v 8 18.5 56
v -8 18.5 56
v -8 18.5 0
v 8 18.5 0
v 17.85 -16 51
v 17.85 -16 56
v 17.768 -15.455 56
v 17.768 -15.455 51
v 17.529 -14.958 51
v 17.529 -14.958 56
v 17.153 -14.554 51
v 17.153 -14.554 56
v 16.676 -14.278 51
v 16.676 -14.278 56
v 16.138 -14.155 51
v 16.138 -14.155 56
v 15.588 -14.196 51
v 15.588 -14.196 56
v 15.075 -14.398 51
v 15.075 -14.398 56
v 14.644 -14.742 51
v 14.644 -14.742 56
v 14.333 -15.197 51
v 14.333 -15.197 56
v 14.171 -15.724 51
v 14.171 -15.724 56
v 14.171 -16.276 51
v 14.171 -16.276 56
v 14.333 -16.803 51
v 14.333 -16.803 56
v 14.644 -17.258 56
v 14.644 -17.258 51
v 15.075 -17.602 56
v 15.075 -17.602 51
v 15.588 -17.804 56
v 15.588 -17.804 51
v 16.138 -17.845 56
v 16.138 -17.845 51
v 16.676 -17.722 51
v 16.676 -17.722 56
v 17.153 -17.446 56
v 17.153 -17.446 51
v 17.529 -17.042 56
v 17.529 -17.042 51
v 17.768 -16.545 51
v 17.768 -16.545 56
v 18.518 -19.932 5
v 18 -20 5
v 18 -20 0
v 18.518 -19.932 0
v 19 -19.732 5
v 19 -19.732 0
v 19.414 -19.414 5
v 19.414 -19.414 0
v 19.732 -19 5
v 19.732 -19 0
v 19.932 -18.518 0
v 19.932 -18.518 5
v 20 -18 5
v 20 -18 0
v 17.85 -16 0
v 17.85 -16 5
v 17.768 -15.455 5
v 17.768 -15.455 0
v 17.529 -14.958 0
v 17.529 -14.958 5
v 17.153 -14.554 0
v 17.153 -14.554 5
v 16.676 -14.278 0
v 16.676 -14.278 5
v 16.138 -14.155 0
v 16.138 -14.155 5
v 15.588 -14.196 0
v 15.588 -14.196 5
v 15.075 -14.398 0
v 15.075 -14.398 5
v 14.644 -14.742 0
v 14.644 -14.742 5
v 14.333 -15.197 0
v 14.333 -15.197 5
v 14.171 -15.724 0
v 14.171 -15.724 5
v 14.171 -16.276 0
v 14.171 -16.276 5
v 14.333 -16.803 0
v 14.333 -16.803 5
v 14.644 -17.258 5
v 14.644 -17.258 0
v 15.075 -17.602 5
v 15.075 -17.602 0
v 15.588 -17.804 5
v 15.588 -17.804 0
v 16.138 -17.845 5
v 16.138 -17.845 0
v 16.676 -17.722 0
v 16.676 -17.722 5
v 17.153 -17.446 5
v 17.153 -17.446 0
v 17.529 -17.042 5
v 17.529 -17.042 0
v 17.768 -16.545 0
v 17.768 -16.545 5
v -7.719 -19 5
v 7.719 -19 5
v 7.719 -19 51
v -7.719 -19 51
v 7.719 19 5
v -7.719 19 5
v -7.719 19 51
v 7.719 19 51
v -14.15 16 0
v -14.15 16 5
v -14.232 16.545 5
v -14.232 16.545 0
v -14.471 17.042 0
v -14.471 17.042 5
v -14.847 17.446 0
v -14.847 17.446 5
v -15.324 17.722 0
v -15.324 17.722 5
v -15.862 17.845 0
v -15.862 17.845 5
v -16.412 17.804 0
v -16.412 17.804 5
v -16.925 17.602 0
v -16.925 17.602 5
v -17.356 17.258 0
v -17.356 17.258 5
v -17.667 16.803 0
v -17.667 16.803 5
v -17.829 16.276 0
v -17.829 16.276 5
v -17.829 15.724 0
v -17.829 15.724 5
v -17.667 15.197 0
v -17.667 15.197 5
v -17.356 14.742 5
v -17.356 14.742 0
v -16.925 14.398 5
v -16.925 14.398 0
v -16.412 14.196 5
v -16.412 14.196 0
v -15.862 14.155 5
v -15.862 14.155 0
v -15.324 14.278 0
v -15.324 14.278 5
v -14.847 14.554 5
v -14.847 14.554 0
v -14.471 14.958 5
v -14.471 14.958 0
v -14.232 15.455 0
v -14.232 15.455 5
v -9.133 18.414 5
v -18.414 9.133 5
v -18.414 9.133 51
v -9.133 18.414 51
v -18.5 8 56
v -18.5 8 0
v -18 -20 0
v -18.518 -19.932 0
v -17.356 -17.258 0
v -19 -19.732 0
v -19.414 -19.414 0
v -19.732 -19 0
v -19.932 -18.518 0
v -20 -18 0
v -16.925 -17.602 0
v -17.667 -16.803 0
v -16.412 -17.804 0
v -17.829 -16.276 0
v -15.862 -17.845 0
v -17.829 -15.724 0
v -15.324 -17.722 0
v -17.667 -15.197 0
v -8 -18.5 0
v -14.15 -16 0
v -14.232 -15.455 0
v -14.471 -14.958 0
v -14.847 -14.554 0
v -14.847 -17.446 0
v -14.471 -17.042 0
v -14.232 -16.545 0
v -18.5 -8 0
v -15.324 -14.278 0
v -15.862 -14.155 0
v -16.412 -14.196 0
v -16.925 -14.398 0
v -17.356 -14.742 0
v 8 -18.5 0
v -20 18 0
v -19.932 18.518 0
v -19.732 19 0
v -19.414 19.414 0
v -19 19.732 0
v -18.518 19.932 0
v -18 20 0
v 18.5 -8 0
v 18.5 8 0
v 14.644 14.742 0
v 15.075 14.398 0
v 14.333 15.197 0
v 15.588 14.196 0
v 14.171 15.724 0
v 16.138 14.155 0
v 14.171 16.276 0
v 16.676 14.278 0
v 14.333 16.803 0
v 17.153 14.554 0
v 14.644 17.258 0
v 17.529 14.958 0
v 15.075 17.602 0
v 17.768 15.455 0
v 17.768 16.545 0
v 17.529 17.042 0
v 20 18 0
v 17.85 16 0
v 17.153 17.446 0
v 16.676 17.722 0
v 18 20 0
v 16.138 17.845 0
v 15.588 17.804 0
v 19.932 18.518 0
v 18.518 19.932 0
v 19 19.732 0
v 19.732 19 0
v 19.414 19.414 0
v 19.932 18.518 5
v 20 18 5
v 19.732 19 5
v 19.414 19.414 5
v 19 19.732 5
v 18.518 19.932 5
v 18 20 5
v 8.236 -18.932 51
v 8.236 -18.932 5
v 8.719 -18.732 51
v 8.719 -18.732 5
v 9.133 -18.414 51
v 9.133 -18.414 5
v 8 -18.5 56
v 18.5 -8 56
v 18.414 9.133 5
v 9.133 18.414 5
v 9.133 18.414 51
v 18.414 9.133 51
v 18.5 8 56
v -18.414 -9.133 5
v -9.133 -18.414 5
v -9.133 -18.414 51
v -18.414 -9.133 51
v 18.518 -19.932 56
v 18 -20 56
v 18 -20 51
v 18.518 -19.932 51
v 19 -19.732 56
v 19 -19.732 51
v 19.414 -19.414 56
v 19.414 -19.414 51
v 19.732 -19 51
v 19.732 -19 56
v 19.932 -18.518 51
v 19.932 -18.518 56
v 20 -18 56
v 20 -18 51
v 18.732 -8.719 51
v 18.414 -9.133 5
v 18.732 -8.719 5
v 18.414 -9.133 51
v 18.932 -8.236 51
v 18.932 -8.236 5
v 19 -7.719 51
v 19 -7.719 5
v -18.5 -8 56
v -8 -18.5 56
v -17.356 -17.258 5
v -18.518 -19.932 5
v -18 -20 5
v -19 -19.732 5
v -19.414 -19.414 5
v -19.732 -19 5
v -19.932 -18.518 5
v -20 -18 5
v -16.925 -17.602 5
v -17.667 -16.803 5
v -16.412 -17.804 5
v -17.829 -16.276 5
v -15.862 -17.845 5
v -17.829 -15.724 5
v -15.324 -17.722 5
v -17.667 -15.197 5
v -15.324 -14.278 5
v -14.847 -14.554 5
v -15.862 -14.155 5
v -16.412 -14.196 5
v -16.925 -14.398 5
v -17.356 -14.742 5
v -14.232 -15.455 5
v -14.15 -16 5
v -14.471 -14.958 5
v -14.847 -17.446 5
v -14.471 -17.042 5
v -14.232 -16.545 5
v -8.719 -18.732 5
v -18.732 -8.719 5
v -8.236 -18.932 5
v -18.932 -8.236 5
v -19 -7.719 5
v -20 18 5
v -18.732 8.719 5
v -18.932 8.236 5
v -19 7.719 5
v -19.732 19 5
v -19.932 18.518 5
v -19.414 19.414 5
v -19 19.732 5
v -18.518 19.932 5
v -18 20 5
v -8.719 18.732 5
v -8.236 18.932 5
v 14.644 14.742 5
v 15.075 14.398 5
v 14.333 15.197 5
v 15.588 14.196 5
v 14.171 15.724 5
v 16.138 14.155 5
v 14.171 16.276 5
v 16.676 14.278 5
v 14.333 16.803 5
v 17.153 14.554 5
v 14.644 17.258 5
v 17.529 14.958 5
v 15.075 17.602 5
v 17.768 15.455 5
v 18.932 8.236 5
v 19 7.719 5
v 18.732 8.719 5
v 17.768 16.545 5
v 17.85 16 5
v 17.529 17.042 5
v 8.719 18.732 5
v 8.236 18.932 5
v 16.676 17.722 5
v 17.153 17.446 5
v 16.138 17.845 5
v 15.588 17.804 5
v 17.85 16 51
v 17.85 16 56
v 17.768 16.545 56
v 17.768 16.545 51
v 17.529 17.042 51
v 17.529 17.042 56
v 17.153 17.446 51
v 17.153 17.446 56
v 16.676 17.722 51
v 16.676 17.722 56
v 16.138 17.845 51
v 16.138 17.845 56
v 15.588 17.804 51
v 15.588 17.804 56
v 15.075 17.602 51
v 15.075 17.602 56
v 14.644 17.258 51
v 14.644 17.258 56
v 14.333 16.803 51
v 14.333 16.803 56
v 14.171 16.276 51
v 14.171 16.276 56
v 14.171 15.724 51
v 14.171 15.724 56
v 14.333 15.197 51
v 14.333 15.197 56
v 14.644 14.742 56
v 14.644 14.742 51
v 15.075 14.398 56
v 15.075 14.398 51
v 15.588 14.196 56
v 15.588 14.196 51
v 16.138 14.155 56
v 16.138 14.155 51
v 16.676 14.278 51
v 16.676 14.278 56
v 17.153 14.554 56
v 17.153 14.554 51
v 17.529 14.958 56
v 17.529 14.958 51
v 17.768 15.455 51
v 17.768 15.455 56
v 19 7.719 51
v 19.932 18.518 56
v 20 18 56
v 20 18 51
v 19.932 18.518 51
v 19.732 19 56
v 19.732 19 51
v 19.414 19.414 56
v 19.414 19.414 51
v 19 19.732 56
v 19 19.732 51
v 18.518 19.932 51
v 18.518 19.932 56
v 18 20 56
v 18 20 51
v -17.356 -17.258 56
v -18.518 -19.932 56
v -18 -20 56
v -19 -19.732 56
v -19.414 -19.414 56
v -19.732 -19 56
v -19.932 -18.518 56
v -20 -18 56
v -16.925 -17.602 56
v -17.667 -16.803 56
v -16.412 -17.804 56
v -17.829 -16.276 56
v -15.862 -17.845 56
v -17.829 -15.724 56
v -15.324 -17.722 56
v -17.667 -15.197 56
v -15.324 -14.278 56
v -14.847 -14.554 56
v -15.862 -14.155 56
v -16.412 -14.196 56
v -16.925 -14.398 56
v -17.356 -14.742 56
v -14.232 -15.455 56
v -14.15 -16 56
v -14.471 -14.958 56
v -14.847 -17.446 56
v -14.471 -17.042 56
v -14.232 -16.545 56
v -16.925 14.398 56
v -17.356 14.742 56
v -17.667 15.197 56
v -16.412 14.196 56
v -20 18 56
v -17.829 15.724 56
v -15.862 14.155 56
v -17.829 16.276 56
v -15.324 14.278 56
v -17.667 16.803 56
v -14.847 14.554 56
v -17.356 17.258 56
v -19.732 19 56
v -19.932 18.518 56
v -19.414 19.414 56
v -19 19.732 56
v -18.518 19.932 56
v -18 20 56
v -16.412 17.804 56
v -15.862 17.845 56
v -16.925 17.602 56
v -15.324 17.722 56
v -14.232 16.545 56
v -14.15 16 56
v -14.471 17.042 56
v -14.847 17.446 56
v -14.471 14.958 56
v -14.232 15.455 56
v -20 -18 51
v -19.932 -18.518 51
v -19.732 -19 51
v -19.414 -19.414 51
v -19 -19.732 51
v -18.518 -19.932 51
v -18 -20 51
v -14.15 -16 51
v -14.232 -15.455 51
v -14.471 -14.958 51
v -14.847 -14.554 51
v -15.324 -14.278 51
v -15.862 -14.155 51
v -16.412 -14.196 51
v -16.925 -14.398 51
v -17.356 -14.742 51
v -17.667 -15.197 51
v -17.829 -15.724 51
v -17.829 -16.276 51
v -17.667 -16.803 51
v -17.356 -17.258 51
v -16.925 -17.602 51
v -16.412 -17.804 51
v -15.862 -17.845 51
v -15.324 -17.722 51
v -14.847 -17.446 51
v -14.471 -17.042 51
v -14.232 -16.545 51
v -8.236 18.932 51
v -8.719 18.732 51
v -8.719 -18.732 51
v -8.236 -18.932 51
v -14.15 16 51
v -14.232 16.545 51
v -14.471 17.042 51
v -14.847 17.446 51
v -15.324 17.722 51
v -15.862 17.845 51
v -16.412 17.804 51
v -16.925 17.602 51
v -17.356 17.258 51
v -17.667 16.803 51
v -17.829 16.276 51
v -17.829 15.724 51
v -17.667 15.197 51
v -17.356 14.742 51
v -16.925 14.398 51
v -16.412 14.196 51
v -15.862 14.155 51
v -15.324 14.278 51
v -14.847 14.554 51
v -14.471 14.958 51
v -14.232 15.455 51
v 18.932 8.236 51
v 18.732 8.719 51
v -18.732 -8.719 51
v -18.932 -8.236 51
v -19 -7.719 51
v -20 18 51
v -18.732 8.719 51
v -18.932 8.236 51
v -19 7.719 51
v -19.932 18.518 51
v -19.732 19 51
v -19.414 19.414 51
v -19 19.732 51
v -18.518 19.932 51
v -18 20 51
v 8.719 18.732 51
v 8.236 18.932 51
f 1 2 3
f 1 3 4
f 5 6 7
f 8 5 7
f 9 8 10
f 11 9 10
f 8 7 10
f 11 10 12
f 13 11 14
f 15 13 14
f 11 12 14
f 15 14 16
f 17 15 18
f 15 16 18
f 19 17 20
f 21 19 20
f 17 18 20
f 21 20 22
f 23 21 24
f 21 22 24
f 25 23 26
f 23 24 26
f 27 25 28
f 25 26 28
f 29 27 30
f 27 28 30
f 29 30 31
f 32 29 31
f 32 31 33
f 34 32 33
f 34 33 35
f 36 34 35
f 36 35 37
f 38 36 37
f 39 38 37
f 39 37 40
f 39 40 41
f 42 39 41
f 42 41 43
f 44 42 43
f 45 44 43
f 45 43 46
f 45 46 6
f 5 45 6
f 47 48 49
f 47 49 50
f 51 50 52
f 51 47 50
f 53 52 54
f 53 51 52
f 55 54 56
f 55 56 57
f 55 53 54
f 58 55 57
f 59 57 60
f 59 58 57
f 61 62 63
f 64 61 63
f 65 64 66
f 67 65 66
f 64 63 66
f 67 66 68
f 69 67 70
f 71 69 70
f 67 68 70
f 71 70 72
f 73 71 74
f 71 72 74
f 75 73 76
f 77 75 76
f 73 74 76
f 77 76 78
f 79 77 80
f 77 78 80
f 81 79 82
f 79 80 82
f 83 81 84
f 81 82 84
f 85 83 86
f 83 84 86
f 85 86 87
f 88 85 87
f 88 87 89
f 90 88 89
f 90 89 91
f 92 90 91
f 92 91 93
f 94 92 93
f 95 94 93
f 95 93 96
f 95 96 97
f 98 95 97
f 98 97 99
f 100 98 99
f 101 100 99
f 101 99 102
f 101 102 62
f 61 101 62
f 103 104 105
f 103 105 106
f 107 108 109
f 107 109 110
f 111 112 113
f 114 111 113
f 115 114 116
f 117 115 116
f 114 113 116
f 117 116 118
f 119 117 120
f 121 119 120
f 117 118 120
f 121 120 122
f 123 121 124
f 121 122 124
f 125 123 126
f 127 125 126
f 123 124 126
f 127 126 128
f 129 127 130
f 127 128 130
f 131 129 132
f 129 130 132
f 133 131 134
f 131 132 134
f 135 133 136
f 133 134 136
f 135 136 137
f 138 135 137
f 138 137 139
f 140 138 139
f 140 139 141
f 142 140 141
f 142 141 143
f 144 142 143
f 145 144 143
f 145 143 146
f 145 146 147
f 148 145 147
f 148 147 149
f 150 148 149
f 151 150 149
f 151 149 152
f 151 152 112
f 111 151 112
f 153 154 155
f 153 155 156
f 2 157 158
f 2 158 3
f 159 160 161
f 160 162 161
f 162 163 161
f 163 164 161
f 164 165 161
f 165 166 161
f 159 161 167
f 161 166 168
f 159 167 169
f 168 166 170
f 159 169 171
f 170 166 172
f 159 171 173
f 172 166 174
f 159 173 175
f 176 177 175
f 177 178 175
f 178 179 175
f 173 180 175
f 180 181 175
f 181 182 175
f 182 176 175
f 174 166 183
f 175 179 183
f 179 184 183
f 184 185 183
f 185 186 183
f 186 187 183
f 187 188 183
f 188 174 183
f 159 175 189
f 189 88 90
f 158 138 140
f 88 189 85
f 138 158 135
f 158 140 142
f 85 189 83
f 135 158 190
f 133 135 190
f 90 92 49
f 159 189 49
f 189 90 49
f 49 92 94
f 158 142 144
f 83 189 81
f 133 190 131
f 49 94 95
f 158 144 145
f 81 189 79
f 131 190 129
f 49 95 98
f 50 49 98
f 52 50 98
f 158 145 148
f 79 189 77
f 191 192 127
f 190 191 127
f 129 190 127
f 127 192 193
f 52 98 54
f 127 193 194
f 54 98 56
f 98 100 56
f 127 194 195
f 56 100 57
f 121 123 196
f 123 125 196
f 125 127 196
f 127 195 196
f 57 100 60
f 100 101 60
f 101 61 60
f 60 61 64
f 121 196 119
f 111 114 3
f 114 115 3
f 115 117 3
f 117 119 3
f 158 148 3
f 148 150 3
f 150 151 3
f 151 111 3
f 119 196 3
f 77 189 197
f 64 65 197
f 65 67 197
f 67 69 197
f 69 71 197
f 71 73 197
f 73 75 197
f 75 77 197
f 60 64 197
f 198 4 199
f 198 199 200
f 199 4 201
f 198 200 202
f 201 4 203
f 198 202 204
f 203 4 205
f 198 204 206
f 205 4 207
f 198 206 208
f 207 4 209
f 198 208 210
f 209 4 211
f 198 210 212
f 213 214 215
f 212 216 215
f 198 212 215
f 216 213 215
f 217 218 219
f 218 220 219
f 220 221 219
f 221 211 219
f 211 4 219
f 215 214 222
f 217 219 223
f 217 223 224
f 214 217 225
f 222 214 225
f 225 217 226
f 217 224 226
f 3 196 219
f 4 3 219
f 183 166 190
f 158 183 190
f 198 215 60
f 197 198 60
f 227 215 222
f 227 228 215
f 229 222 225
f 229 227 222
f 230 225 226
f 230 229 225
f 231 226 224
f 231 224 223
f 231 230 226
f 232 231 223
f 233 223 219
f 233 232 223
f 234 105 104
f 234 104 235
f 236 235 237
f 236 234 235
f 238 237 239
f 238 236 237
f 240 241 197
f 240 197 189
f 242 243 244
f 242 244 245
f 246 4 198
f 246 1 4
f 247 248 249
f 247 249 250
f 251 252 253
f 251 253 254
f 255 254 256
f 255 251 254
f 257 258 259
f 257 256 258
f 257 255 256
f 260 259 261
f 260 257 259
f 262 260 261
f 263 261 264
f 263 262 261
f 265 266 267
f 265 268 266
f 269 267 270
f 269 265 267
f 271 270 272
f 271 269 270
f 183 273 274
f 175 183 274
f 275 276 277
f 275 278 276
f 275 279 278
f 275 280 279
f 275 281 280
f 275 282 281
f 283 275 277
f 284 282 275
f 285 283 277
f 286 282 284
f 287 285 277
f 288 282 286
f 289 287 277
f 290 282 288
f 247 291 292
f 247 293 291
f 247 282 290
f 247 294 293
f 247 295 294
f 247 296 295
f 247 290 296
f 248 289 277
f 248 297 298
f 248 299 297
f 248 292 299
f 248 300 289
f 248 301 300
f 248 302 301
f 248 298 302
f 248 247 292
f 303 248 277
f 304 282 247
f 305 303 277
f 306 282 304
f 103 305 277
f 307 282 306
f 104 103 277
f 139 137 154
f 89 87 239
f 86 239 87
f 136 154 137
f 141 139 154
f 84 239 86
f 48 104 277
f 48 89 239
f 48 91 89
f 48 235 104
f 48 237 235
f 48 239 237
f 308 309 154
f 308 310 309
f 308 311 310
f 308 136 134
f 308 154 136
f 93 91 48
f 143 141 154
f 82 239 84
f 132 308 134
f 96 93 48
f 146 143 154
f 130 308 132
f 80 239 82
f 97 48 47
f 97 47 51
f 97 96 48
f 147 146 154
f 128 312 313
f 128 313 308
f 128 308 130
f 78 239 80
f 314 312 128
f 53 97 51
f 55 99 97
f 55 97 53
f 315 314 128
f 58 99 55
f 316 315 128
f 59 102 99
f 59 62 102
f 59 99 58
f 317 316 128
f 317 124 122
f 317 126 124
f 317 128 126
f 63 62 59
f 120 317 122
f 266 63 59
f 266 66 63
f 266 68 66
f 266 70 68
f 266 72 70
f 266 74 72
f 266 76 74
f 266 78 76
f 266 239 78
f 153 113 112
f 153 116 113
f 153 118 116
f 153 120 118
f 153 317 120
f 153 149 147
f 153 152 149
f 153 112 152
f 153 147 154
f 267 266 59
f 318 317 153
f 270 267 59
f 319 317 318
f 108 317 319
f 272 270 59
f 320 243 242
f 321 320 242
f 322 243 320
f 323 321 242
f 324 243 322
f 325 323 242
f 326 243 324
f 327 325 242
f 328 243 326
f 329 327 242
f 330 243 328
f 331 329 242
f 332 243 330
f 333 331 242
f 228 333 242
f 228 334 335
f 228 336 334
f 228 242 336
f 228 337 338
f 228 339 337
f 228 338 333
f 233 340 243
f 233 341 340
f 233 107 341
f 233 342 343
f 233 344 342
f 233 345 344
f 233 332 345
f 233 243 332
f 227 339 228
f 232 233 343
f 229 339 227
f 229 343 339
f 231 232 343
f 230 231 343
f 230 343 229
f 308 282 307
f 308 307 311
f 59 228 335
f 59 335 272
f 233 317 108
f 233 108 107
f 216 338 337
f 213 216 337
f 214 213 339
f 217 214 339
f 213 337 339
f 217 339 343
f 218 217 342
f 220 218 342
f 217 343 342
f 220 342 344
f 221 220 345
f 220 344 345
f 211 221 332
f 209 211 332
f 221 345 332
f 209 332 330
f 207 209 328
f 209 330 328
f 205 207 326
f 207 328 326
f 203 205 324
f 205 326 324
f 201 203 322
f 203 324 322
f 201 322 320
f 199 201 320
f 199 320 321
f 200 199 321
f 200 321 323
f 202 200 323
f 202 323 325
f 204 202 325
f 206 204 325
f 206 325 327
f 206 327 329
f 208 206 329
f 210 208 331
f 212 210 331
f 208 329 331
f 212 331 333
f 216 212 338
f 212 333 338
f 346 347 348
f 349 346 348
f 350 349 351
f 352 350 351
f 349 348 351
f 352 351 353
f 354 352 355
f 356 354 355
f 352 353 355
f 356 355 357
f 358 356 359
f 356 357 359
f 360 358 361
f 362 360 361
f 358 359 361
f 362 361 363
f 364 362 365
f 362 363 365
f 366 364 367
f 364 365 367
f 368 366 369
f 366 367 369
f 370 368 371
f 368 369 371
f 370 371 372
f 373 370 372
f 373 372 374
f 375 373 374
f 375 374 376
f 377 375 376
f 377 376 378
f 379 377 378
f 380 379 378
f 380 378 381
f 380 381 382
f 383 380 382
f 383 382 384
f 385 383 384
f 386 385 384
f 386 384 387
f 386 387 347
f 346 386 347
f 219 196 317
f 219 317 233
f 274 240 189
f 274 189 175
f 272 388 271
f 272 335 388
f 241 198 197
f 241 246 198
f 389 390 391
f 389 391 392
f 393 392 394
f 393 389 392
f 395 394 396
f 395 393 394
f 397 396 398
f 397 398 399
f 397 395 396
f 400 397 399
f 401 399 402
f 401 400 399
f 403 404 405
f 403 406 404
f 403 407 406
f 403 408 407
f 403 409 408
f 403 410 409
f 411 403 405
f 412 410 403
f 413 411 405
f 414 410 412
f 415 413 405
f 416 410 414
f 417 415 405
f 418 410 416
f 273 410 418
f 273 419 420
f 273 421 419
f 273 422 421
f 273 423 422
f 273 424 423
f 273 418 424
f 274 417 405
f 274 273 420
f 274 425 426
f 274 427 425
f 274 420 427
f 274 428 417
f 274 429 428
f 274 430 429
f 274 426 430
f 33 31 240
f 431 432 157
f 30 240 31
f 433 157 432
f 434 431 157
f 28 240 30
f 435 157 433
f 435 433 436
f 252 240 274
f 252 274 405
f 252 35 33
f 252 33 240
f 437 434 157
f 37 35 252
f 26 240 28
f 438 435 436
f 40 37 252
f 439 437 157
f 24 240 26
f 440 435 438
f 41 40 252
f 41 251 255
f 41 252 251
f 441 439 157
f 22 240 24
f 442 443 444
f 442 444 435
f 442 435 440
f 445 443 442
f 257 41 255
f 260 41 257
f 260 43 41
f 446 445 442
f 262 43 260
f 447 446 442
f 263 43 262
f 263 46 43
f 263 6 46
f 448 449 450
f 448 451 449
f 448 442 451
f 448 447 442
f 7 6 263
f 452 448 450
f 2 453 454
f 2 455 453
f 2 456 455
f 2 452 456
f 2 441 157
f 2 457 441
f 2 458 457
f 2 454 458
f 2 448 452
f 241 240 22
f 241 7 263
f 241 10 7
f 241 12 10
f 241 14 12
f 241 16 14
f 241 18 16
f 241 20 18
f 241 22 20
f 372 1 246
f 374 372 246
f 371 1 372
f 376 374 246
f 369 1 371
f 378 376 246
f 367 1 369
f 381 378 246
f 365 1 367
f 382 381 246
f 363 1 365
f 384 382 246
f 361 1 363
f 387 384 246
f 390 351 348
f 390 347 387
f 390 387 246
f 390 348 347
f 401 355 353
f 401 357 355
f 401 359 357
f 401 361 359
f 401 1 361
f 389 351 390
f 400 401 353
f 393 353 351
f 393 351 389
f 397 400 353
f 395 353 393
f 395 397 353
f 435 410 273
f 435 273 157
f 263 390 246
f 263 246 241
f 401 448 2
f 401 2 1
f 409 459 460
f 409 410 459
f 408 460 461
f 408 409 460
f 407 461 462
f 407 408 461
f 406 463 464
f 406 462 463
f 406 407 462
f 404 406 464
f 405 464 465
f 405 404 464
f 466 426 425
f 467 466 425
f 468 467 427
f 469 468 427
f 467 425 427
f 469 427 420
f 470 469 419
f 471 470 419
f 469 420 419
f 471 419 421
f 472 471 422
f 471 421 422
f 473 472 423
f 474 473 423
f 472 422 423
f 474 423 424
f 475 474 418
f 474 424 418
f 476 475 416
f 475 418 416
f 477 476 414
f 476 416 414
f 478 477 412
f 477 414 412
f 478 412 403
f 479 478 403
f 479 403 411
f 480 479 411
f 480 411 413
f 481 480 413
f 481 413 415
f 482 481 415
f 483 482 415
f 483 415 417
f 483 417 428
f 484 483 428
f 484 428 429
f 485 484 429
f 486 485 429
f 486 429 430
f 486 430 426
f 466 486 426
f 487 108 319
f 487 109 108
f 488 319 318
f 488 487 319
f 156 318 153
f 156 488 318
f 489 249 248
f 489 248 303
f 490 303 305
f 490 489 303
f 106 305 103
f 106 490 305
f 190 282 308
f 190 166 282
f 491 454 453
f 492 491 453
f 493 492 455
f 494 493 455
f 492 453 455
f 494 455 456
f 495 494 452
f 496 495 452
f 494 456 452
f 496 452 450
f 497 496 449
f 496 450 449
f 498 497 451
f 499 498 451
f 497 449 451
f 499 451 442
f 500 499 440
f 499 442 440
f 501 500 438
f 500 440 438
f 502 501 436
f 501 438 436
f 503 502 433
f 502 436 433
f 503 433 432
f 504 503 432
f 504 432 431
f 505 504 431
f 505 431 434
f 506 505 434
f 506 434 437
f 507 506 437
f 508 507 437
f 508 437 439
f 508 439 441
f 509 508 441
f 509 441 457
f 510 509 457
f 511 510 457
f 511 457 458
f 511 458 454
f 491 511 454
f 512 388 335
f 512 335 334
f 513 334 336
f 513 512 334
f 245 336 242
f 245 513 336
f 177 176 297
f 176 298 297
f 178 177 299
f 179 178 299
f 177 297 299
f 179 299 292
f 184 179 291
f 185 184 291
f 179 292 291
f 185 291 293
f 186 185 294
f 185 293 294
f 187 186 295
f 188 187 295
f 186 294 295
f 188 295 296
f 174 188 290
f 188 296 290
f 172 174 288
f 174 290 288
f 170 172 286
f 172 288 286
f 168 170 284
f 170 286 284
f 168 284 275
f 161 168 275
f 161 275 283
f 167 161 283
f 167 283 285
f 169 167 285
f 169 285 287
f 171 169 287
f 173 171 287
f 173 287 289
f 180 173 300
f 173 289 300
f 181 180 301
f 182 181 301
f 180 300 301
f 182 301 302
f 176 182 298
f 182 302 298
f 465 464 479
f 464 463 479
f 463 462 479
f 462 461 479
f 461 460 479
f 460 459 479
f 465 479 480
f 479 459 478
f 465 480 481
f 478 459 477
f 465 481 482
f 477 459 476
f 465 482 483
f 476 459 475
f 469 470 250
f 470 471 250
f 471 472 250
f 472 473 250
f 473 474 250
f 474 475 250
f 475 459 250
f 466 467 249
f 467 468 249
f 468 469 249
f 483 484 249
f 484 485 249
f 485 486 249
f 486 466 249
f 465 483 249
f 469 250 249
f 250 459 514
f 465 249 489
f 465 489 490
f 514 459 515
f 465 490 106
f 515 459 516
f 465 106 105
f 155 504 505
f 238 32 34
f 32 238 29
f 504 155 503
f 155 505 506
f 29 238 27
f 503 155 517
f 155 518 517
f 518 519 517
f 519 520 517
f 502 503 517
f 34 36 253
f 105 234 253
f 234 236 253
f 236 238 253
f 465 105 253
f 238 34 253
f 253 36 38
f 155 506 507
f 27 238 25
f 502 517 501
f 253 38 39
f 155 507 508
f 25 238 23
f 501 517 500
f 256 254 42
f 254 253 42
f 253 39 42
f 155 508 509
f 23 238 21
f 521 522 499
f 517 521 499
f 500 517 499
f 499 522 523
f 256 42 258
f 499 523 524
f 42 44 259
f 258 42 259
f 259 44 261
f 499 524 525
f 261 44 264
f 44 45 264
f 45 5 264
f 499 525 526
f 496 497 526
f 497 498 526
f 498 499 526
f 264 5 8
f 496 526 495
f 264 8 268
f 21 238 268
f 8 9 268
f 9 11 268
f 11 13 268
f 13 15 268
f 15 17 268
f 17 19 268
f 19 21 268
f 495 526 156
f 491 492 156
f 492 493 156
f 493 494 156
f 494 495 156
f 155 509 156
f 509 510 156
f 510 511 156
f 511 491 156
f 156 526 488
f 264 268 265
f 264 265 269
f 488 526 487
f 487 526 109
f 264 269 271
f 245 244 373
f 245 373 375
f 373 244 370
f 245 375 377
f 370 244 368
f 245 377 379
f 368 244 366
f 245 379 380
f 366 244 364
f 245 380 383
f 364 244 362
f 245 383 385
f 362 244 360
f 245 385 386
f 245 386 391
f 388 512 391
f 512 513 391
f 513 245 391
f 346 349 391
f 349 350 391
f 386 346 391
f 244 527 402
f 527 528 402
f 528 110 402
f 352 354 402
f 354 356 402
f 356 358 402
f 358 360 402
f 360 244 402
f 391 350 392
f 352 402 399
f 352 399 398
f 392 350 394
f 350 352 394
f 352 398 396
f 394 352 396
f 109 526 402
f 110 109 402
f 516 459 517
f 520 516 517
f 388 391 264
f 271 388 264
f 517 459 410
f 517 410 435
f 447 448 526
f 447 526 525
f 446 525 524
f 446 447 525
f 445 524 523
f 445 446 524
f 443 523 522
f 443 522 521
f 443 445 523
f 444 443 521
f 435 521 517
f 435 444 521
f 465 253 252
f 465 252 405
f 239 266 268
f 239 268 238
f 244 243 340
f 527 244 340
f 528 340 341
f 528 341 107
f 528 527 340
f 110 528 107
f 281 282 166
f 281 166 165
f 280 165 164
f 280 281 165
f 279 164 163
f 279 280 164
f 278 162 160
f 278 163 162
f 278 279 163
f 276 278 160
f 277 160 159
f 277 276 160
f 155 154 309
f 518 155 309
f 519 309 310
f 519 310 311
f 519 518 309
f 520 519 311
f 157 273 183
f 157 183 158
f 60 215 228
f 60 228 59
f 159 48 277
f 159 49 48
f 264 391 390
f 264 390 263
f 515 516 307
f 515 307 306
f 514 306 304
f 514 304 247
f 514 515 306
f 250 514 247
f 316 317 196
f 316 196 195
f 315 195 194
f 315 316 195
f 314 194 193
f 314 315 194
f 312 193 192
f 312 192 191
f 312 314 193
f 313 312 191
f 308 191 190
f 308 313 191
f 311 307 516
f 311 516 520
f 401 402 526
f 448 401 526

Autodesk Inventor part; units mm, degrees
ref_plane "YZ Plane" through (0, 0, 0) normal (1, 0, 0) x (0, 1, 0)
ref_plane "XZ Plane" through (0, 0, 0) normal (0, 1, 0) x (-1, 0, 0)
ref_plane "XY Plane" through (0, 0, 0) normal (0, 0, 1) x (1, 0, 0)
sketch "Sketch1" plane through (0, 0, 0) normal (0, 0, 1) x (1, 0, 0)
  line L0 (20, -20) -> (-20, -20)
  line L1 (-20, -20) -> (-20, 20)
  line L2 (-20, 20) -> (20, 20)
  line L3 (20, 20) -> (20, -20)
  line L4 (20, -20) -> (-20, 20) construction
  line L5 (-20, -20) -> (20, 20) construction
  point P0 (0, 0)
  dimension "d0" = 40
  dimension "d1" = 40
extrude "Extrusion1" add sketch "Sketch1" along normal blind 5
sketch "Sketch2" plane through (0, 0, 5) normal (0, 0, 1) x (1, 0, 0)
  line L0 (20, 20) -> (-20, 20) projected
  line L1 (-20, 20) -> (-20, -20) projected
  line L2 (8.547, -19) -> (-8.547, -19)
  line L3 (-19, -8.547) -> (-19, 8.547)
  line L4 (-8.547, 19) -> (8.547, 19)
  line L5 (19, 8.547) -> (19, -8.547)
  line L6 (19, -19) -> (-19, 19) construction
  line L7 (-19, -19) -> (19, 19) construction
  line L8 (19, 6.0309) -> (19, -12.9361)
  line L9 (-19, 8.547) -> (-8.547, 19)
  line L10 (8.547, 19) -> (19, 8.547)
  line L11 (19, -8.547) -> (8.547, -19)
  line L12 (-8.547, -19) -> (-19, -8.547)
  point P0 (0, 0)
  dimension "d16" = 38
  dimension "d17" = 38
  dimension "d18" = 10.453
  dimension "d19" = 10.453
  dimension "d20" = 10.453
  dimension "d21" = 10.453
  dimension "d22" = 10.453
  dimension "d23" = 10.453
  dimension "d24" = 10.453
  dimension "d25" = 10.453
extrude "Extrusion2" add sketch "Sketch2" along normal blind 46
sketch "Sketch3" plane through (0, 0, 51) normal (0, 0, 1) x (1, 0, 0)
  line L0 (20, 20) -> (-20, 20) projected
  line L1 (20, -20) -> (-20, -20)
  line L2 (-20, -20) -> (-20, 20)
  line L3 (-20, 20) -> (20, 20)
  line L4 (20, 20) -> (20, -20)
  line L5 (20, -20) -> (-20, 20) construction
  line L6 (-20, -20) -> (20, 20) construction
  point P0 (0, 0)
extrude "Extrusion3" add sketch "Sketch3" along normal blind 5
sketch "Sketch5" plane through (0, 0, 56) normal (0, 0, 1) x (1, 0, 0)
  line L0 (8, -18.5) -> (-8, -18.5)
  line L1 (-18.5, -8) -> (-18.5, 8)
  line L2 (-8, 18.5) -> (8, 18.5)
  line L3 (18.5, 8) -> (18.5, -8)
  line L4 (18.5, -18.5) -> (-18.5, 18.5) construction
  line L5 (-18.5, -18.5) -> (18.5, 18.5) construction
  line L6 (-18.5, 8) -> (-8, 18.5)
  line L7 (8, 18.5) -> (18.5, 8)
  line L8 (18.5, -8) -> (8, -18.5)
  line L9 (-18.5, -8) -> (-8, -18.5)
  point P0 (0, 0)
  dimension "d27" = 37
  dimension "d28" = 37
  dimension "d29" = 10.5
  dimension "d30" = 10.5
  dimension "d31" = 10.5
  dimension "d32" = 10.5
  dimension "d33" = 10.5
  dimension "d34" = 10.5
  dimension "d35" = 10.5
  dimension "d36" = 10.5
extrude "Extrusion5" cut sketch "Sketch5" against normal through all
fillet "Fillet2" radius 2 16 edges at (20, 20, 53.5) (20, 20, 2.5) (-20, 20, 53.5) (-20, 20, 2.5) (-20, -20, 53.5) (-20, -20, 2.5) (20, -20, 53.5) (20, -20, 2.5) (19, -8.547, 28) (8.547, -19, 28) (-8.547, -19, 28) (-19, -8.547, 28) (-19, 8.547, 28) (-8.547, 19, 28) (8.547, 19, 28) (19, 8.547, 28)
sketch "Sketch6" plane through (0, 0, 56) normal (0, 0, 1) x (1, 0, 0)
  line L0 (-16, -16) -> (16, -16) construction
  line L1 (16, -16) -> (16, 16) construction
  line L2 (16, 16) -> (-16, 16) construction
  line L3 (-16, 16) -> (-16, -16) construction
  line L4 (-16, -16) -> (16, 16) construction
  line L5 (16, -16) -> (-16, 16) construction
  circle A0 centre (16, 16) radius 1.85
  circle A1 centre (16, -16) radius 1.85
  circle A2 centre (-16, -16) radius 1.85
  circle A3 centre (-16, 16) radius 1.85
  point P0 (0, 0)
  dimension "d40" = 32
  dimension "d41" = 32
  dimension "d42" = 3.7
  dimension "d43" = 3.7
  dimension "d44" = 3.7
  dimension "d45" = 3.7
extrude "Extrusion6" cut sketch "Sketch6" against normal blind 56
equation "\"d19\" = d18"
equation "\"d20\" = d18"
equation "\"d21\" = d20"
equation "\"d22\" = d18"
equation "\"d23\" = d22"
equation "\"d24\" = d18"
equation "\"d25\" = d24"
equation "\"d30\" = d29"
equation "\"d31\" = d29"
equation "\"d32\" = d31"
equation "\"d33\" = d29"
equation "\"d34\" = d33"
equation "\"d35\" = d29"
equation "\"d36\" = d35"
properties part number "fan"
